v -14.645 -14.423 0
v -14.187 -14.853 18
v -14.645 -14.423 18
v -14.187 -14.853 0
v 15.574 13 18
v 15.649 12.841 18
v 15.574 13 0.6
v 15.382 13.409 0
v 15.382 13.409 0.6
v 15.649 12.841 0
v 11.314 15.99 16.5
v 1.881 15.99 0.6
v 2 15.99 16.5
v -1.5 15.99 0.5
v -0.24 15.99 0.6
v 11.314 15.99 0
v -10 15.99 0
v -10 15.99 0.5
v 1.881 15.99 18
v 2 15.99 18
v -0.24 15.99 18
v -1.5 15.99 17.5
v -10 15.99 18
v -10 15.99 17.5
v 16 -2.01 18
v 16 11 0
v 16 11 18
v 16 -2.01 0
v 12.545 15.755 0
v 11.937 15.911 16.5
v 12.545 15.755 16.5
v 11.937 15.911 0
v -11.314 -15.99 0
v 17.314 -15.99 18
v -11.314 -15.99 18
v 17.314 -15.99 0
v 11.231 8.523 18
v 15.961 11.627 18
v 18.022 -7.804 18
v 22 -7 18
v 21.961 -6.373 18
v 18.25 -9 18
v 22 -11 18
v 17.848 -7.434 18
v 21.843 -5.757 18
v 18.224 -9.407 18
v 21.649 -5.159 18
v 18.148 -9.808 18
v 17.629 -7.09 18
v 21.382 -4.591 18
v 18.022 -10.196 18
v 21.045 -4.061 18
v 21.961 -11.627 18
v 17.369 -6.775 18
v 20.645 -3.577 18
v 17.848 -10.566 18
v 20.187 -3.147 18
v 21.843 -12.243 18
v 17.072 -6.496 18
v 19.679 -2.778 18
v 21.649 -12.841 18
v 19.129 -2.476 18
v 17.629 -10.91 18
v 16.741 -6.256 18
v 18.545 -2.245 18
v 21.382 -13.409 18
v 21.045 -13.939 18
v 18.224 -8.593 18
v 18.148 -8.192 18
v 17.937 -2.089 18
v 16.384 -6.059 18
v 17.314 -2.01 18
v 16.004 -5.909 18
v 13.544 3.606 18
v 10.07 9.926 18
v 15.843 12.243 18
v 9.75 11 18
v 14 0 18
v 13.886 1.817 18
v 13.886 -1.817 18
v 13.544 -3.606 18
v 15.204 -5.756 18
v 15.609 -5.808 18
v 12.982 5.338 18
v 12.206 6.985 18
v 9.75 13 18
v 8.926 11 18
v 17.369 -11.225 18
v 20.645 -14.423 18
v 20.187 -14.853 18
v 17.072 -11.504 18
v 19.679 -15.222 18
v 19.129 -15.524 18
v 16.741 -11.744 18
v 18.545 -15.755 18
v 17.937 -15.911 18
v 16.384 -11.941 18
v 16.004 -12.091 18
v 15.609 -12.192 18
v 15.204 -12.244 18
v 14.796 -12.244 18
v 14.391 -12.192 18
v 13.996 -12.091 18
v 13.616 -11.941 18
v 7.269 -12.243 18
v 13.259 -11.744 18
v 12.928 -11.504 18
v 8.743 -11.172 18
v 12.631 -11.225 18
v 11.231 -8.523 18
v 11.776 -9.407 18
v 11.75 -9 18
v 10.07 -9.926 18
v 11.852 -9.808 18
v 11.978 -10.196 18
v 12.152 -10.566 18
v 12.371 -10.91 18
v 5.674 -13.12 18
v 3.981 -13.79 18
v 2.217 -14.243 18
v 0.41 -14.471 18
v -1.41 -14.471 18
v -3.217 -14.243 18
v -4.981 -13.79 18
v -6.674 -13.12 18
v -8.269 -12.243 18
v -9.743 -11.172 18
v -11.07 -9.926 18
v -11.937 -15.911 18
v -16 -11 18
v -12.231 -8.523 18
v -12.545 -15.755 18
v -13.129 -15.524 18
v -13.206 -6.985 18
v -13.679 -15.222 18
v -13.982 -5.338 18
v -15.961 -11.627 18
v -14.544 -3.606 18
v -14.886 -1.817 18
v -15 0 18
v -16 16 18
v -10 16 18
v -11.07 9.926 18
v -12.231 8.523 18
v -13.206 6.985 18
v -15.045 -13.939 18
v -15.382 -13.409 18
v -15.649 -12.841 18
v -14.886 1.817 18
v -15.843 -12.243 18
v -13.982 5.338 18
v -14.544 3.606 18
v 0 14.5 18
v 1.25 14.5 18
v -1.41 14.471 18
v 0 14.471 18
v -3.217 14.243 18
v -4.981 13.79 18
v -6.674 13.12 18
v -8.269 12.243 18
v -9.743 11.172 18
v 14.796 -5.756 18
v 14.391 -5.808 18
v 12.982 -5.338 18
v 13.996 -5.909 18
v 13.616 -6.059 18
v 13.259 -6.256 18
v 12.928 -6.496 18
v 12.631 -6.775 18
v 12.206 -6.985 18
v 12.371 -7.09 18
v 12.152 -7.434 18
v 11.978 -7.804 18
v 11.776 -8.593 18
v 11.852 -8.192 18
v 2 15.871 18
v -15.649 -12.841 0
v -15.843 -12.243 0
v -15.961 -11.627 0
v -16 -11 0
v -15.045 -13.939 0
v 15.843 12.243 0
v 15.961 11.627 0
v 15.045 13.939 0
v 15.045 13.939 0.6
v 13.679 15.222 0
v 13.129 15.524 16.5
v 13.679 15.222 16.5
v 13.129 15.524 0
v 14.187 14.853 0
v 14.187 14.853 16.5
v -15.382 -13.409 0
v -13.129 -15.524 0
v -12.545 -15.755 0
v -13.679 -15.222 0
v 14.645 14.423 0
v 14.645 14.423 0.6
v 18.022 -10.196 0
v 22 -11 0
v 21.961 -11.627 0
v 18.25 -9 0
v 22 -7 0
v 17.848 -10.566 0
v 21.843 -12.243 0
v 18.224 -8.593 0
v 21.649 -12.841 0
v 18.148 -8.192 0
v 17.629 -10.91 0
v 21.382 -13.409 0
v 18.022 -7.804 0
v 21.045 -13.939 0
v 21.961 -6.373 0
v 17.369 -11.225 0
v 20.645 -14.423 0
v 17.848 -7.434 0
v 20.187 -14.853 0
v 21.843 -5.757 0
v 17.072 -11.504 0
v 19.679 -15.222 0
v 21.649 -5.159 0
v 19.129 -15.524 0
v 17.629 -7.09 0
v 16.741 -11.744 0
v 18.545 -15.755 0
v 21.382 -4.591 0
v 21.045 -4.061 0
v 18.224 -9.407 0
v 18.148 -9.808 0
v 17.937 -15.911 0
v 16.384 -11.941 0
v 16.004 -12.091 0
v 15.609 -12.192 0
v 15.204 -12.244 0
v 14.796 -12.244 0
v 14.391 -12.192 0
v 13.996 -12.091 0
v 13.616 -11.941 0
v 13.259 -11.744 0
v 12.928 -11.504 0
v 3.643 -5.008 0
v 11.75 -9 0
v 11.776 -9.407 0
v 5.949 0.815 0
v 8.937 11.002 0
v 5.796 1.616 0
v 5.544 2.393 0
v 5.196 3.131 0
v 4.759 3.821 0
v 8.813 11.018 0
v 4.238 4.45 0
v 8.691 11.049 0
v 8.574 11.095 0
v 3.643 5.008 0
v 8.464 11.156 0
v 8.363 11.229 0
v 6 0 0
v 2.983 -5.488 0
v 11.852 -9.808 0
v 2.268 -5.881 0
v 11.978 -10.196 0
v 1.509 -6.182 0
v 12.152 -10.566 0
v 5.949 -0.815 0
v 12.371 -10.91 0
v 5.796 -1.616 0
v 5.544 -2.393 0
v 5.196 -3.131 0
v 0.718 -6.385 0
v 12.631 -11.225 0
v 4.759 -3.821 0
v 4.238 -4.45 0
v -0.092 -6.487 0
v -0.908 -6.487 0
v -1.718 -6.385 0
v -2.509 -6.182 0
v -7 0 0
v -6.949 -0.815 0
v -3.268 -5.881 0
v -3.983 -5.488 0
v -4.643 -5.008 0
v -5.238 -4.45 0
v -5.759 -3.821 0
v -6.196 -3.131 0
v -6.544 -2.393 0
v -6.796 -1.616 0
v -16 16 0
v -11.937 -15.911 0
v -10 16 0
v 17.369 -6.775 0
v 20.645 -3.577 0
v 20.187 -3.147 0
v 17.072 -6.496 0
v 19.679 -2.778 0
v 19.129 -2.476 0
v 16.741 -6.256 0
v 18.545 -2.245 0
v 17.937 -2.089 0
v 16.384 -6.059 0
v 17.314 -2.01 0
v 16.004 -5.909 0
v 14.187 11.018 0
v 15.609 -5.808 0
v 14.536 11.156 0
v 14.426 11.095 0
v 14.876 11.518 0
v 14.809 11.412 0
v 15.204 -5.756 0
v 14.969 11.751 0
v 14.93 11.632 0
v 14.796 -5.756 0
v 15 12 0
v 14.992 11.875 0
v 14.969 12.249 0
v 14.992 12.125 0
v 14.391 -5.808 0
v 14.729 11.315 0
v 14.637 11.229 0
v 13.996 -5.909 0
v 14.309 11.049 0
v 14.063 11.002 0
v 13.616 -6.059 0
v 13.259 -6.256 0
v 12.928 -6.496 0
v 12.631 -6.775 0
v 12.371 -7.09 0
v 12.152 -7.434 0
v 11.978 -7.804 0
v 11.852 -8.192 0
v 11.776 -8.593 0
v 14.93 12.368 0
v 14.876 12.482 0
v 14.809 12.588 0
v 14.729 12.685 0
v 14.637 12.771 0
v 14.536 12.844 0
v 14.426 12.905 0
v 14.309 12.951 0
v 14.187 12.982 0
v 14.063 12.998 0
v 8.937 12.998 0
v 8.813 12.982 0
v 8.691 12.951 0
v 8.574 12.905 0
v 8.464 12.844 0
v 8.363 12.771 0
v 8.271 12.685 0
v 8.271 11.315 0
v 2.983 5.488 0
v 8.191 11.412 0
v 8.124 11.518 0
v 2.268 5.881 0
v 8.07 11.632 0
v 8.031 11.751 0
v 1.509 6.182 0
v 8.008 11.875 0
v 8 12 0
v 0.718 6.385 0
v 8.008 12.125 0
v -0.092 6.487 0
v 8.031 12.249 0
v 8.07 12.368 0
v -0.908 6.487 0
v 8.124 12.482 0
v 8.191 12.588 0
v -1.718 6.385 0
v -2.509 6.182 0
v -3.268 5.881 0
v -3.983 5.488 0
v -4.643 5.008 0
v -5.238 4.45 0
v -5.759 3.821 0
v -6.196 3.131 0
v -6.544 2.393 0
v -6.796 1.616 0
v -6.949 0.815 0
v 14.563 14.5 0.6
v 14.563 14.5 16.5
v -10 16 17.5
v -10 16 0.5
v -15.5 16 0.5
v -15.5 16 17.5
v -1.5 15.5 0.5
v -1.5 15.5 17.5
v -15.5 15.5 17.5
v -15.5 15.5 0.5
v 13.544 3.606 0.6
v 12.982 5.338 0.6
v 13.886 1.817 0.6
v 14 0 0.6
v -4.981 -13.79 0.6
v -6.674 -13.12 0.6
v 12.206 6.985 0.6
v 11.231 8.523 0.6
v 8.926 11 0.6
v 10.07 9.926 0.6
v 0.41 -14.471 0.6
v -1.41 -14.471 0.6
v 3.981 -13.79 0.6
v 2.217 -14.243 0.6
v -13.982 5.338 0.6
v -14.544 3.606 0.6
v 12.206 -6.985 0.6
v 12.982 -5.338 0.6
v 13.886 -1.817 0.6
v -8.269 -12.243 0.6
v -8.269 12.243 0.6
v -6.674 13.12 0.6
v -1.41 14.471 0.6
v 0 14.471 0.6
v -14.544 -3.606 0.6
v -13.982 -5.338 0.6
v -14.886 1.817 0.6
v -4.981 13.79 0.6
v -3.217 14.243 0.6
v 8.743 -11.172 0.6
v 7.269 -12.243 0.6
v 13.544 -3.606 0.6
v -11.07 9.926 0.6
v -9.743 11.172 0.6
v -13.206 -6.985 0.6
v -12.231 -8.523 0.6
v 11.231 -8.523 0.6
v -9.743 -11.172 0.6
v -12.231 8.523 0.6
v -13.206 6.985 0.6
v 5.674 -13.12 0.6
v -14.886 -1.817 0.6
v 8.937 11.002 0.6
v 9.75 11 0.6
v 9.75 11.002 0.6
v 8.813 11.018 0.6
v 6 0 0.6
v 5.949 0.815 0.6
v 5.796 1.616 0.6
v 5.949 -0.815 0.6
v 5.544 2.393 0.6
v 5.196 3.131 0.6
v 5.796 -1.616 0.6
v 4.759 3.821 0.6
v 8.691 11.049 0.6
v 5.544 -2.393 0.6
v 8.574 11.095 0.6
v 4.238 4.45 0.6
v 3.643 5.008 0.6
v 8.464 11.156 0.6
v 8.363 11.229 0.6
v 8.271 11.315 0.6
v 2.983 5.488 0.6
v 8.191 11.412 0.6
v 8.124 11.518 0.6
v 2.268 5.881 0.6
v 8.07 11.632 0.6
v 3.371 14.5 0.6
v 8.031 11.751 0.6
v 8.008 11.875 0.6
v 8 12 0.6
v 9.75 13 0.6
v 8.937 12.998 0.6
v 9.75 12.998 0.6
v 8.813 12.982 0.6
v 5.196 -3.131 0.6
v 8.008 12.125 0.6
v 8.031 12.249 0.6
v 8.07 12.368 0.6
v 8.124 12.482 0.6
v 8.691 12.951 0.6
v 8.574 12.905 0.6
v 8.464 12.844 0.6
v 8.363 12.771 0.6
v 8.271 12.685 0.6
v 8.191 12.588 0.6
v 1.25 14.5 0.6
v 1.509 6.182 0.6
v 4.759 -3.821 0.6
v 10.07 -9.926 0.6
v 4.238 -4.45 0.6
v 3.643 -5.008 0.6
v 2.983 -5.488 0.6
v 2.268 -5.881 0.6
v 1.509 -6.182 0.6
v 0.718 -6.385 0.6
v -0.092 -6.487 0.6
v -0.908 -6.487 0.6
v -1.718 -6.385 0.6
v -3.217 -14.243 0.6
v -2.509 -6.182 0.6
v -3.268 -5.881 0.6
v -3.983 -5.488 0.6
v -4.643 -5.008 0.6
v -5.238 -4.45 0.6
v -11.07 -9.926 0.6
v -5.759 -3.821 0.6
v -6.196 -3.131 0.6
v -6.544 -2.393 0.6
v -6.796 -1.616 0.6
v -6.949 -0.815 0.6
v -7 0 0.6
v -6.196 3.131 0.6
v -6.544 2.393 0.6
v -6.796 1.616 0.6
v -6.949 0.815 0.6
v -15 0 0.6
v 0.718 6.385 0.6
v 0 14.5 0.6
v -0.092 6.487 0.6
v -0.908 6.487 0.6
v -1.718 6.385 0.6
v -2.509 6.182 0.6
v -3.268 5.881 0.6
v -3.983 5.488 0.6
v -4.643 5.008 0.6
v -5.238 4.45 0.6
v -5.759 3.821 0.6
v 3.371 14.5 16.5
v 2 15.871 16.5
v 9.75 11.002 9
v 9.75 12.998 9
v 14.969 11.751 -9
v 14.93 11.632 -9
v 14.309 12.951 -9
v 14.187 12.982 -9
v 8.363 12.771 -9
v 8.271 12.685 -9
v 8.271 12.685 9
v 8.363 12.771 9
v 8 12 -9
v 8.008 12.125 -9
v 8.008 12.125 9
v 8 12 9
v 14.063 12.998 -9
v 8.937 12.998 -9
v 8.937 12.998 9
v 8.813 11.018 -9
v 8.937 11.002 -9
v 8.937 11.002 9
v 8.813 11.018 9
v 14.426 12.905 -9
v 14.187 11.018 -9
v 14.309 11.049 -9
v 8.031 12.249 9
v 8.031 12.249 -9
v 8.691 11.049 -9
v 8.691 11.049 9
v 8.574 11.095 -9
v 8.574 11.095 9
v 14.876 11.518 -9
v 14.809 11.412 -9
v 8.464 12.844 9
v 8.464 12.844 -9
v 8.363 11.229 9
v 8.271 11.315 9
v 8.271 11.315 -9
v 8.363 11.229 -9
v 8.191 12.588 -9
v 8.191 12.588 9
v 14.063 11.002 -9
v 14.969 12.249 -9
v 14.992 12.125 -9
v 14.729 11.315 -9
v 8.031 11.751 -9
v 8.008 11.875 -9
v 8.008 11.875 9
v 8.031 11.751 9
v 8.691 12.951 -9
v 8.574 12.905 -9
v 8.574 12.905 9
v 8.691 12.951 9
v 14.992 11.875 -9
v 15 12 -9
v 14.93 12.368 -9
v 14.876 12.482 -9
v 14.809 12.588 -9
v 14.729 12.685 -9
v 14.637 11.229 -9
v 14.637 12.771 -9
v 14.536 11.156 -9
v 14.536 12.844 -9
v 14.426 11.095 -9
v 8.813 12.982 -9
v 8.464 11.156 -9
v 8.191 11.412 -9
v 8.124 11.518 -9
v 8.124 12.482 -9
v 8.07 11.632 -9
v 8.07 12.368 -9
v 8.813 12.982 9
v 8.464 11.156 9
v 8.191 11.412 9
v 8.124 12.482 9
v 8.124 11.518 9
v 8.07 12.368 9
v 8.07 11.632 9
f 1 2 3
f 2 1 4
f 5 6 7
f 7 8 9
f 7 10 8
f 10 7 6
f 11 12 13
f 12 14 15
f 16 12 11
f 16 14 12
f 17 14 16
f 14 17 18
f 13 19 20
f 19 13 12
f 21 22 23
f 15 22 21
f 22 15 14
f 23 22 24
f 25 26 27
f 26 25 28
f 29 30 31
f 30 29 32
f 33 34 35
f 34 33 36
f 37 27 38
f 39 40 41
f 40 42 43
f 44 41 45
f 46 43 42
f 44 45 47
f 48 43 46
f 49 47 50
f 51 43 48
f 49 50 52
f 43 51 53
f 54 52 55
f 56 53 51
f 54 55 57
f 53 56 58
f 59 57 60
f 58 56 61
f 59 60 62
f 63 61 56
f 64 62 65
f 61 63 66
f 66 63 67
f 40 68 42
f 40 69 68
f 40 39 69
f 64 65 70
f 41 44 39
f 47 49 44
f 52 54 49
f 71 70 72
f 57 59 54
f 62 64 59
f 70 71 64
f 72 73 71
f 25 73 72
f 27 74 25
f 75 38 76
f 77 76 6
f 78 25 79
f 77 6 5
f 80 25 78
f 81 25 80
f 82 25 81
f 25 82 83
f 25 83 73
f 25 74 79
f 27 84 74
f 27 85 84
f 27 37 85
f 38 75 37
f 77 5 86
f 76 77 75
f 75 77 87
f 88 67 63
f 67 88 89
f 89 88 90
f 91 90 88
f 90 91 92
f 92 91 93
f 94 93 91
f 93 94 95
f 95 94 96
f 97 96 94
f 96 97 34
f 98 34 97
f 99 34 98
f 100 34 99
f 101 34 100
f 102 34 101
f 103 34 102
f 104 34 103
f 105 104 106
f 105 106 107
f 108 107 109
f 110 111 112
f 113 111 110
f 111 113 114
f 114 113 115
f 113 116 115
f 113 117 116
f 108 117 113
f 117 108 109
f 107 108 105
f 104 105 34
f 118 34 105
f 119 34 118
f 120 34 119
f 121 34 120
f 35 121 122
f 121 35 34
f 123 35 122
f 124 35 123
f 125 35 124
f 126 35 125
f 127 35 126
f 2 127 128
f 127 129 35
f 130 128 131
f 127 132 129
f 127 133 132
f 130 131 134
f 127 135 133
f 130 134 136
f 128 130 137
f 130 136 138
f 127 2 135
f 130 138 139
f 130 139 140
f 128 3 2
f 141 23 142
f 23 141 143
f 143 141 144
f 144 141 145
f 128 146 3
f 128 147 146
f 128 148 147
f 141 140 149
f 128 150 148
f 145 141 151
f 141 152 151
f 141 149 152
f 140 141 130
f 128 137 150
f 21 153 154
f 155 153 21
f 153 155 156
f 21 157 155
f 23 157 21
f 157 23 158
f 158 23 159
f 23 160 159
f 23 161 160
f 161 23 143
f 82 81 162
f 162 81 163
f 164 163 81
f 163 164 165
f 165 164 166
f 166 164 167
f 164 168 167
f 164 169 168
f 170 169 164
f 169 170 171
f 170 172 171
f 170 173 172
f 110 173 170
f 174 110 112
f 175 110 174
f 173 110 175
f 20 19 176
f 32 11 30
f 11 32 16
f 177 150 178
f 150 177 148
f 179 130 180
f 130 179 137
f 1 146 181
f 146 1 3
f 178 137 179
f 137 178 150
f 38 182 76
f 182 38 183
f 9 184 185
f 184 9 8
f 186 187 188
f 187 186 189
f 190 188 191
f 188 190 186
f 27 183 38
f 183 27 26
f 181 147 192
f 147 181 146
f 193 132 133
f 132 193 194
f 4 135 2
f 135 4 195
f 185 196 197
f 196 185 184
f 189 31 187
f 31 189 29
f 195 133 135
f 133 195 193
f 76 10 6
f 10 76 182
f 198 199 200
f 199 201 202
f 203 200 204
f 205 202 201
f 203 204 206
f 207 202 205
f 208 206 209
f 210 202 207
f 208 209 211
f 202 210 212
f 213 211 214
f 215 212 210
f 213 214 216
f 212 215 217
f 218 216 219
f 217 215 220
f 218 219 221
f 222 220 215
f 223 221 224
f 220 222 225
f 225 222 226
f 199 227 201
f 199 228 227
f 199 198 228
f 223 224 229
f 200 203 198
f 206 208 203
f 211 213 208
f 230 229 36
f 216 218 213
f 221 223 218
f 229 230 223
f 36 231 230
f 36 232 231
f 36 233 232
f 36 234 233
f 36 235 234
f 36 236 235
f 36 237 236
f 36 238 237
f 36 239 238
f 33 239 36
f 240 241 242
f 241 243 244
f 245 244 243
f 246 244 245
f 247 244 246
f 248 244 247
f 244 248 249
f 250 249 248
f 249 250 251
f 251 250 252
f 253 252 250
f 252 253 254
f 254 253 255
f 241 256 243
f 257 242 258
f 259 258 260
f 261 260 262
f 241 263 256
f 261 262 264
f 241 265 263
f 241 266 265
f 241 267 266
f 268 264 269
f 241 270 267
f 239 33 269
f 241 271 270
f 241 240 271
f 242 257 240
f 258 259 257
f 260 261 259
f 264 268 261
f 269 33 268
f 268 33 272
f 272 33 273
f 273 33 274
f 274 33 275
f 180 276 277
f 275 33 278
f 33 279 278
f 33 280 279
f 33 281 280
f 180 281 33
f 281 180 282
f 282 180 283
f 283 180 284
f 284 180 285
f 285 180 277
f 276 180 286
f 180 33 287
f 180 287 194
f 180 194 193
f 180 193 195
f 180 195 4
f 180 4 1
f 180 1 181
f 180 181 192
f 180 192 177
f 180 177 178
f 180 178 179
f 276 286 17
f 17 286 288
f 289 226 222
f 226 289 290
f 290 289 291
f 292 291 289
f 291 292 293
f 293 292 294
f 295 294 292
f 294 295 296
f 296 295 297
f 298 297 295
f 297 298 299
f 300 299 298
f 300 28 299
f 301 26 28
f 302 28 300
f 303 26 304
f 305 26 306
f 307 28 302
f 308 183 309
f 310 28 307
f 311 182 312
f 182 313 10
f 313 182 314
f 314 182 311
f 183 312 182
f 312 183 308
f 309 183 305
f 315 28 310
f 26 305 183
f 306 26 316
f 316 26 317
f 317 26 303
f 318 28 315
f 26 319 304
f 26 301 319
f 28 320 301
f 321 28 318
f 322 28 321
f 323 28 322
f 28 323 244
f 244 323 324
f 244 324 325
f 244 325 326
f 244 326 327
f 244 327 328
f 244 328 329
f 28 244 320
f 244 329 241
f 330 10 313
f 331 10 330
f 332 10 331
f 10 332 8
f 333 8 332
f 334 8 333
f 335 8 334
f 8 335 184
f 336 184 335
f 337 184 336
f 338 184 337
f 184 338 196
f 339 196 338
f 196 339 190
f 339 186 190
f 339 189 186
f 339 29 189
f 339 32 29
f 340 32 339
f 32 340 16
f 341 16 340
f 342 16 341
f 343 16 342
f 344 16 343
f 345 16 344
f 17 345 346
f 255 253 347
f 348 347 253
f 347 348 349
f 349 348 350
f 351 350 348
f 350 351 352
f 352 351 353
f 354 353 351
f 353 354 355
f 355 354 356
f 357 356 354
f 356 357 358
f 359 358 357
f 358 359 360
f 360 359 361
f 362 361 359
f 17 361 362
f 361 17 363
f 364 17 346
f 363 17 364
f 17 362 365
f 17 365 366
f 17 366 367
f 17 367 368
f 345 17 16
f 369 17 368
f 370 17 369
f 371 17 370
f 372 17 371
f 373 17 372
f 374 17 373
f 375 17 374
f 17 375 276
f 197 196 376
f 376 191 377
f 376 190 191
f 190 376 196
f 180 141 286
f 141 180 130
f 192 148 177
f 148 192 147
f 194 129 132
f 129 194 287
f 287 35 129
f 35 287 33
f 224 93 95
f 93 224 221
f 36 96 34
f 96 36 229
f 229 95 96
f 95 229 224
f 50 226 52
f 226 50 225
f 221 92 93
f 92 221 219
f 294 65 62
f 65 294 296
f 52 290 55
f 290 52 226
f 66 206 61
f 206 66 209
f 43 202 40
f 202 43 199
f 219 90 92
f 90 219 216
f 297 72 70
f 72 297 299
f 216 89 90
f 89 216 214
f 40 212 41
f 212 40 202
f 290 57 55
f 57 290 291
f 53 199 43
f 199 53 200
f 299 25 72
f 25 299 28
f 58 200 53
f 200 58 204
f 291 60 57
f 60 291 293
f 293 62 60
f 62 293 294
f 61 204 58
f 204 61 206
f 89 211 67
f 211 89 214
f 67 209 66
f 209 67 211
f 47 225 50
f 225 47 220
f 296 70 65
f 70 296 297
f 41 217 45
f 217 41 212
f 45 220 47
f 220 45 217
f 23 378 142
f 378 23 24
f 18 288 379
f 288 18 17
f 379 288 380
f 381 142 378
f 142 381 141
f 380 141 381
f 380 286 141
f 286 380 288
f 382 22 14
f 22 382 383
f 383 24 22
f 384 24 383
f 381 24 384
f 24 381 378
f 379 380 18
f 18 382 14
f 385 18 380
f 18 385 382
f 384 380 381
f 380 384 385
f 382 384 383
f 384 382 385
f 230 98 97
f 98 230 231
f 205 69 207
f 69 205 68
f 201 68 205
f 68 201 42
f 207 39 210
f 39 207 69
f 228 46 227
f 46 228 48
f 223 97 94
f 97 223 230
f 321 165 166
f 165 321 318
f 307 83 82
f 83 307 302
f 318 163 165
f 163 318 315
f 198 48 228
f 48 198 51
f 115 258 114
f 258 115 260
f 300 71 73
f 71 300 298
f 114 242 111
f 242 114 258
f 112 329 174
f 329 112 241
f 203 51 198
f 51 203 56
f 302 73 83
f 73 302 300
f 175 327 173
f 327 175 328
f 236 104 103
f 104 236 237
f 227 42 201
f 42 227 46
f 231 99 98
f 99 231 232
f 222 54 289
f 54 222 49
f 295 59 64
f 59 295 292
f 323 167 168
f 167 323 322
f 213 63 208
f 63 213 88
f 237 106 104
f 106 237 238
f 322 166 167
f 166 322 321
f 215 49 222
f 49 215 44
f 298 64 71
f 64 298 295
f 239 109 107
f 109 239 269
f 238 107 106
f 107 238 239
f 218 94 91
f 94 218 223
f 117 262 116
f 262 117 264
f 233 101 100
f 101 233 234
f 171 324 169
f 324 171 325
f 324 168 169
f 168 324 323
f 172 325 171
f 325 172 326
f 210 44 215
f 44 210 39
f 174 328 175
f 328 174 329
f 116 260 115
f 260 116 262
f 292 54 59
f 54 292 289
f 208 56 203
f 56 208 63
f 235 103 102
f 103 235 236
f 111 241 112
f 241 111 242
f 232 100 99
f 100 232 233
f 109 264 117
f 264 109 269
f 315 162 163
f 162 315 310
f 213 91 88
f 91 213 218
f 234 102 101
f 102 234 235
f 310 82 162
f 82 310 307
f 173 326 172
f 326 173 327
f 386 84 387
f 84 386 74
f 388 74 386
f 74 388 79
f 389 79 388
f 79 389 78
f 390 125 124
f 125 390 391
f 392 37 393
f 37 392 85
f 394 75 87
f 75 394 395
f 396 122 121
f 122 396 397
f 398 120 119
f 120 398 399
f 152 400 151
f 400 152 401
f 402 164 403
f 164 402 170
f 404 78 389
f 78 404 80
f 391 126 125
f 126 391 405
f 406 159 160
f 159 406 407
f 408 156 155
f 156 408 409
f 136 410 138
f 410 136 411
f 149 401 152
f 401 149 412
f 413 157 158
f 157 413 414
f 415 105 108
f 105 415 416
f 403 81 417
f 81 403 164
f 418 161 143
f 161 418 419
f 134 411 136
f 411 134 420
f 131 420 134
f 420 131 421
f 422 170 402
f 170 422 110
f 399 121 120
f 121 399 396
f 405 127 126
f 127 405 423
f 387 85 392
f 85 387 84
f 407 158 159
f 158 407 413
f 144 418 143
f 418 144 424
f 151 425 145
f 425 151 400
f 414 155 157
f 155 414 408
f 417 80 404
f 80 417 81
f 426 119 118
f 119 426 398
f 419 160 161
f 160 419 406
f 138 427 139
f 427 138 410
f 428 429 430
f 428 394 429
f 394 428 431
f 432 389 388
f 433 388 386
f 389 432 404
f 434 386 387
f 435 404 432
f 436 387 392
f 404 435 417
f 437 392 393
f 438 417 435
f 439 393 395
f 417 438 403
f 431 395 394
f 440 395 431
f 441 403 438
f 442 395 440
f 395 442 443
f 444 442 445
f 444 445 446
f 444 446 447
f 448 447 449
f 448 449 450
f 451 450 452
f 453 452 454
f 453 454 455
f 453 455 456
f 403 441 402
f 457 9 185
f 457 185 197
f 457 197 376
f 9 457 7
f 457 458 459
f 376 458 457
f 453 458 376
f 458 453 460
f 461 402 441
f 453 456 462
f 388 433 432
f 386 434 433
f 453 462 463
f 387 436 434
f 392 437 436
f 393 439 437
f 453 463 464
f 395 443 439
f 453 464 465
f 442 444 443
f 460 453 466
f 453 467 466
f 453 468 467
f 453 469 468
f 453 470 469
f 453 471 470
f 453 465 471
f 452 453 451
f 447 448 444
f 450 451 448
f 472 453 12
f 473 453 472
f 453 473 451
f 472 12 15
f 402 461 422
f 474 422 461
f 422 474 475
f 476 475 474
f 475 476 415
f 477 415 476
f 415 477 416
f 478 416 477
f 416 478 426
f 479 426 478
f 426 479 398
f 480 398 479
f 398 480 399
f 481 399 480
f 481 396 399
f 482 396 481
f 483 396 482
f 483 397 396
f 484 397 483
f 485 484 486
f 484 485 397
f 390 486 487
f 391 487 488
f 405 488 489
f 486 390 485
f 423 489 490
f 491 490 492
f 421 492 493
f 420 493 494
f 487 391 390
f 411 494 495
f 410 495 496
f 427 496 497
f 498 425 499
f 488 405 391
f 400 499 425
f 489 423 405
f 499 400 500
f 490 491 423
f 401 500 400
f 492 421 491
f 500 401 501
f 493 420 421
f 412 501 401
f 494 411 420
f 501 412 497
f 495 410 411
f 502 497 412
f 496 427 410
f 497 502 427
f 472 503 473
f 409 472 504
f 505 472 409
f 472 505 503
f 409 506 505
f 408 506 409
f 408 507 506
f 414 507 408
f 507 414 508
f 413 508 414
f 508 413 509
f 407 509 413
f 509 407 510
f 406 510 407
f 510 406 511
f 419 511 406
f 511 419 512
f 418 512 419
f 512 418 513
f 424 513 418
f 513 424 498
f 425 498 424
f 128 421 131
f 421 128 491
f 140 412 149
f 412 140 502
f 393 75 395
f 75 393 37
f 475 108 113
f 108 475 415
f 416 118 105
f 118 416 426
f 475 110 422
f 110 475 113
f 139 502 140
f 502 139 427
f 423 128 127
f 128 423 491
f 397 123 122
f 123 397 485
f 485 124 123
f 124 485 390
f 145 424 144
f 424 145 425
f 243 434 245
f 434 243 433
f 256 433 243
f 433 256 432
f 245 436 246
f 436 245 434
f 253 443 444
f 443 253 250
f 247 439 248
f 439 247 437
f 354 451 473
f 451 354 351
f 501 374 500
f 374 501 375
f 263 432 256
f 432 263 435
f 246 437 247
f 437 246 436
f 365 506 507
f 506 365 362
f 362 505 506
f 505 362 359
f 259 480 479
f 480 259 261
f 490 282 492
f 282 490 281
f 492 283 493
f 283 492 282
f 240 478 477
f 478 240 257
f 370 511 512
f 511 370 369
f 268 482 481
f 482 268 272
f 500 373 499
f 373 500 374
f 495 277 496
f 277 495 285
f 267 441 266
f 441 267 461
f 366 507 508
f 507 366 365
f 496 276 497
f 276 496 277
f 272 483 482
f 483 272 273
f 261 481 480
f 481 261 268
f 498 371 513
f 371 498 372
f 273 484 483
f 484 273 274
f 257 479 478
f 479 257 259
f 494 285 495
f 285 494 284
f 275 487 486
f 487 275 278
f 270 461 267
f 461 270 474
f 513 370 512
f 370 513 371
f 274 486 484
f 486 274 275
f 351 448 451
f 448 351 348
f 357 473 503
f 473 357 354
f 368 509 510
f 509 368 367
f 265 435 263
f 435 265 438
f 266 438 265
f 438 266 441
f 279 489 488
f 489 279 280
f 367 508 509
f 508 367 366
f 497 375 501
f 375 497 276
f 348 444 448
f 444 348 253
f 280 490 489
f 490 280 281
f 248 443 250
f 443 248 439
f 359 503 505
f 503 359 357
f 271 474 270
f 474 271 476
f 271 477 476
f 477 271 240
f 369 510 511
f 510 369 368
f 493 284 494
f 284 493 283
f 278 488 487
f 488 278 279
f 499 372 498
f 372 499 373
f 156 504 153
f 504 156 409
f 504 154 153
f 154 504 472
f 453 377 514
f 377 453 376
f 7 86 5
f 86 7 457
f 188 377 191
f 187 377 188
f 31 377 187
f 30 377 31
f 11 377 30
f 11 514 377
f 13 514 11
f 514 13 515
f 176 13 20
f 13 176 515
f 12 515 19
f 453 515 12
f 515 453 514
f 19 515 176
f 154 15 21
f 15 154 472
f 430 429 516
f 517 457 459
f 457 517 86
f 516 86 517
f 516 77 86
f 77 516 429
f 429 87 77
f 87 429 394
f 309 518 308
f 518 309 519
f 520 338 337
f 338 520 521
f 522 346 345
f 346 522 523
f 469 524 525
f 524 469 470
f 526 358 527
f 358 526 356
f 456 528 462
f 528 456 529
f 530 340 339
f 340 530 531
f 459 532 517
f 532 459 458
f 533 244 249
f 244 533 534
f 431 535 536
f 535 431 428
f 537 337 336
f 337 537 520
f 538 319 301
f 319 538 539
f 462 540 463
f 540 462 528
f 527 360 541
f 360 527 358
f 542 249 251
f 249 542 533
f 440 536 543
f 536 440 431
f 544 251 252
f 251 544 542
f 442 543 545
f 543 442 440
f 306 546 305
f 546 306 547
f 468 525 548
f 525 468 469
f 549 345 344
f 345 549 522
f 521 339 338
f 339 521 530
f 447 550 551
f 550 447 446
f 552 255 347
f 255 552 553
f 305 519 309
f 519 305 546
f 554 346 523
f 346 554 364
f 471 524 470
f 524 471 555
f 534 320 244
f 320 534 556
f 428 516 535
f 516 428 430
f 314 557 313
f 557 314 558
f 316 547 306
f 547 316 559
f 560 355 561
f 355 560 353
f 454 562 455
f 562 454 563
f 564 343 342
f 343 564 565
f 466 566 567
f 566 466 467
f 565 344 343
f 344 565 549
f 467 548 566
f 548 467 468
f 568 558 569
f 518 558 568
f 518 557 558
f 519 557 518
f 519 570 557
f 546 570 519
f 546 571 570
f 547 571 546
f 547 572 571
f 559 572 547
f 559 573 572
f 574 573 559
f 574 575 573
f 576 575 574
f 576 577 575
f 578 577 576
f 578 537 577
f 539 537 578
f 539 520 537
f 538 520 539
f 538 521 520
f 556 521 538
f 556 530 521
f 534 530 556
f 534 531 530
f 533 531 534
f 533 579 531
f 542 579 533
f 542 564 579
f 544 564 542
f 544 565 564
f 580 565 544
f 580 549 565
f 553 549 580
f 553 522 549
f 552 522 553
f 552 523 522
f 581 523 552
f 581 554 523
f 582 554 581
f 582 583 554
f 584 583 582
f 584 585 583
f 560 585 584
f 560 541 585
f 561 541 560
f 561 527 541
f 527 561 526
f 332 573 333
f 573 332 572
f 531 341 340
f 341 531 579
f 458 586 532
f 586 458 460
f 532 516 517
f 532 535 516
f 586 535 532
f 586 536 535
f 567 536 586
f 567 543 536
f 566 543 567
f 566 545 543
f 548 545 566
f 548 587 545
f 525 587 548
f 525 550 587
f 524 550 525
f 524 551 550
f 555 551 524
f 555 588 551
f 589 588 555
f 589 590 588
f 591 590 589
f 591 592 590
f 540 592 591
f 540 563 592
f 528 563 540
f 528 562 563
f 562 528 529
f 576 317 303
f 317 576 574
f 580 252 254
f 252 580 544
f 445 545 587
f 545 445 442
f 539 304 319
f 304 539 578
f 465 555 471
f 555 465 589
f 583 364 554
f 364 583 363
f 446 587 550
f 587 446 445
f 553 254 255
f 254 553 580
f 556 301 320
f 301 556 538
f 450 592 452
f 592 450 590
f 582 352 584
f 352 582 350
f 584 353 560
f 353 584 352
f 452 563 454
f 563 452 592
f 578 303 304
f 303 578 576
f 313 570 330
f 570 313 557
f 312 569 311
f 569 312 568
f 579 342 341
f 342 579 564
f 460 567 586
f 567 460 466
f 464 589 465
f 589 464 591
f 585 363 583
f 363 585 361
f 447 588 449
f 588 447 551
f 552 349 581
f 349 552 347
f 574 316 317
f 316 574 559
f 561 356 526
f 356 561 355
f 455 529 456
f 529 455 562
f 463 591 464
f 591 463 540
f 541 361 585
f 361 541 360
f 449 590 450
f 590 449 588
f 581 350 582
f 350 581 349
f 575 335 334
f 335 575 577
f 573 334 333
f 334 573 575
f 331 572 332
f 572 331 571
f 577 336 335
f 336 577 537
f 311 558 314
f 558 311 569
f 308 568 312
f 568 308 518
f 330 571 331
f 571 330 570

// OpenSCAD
$fn = 50;


union() {
	difference() {
		union() {
			hull() {
				translate(v = [-11.0000000000, 11.0000000000, 0]) {
					cylinder(h = 18, r = 5);
				}
				translate(v = [11.0000000000, 11.0000000000, 0]) {
					cylinder(h = 18, r = 5);
				}
				translate(v = [-11.0000000000, -11.0000000000, 0]) {
					cylinder(h = 18, r = 5);
				}
				translate(v = [11.0000000000, -11.0000000000, 0]) {
					cylinder(h = 18, r = 5);
				}
			}
			translate(v = [7.5000000000, -9.0000000000, 0]) {
				hull() {
					translate(v = [-9.5000000000, 2.0000000000, 0]) {
						cylinder(h = 18, r = 5);
					}
					translate(v = [9.5000000000, 2.0000000000, 0]) {
						cylinder(h = 18, r = 5);
					}
					translate(v = [-9.5000000000, -2.0000000000, 0]) {
						cylinder(h = 18, r = 5);
					}
					translate(v = [9.5000000000, -2.0000000000, 0]) {
						cylinder(h = 18, r = 5);
					}
				}
			}
			translate(v = [-16.0000000000, 10.0000000000, 0]) {
				cube(size = [6, 6, 18]);
			}
		}
		union() {
			translate(v = [-15.5000000000, 15.5000000000, 0.5000000000]) {
				cube(size = [14, 0.5000000000, 17.0000000000]);
			}
			translate(v = [15.0000000000, -9.0000000000, -100.0000000000]) {
				cylinder(h = 200, r = 3.2500000000);
			}
			translate(v = [-0.5000000000, 0.0000000000, 0.6000000000]) {
				cylinder(h = 20.4000000000, r = 14.5000000000);
			}
			translate(v = [-0.5000000000, 0.0000000000, -9.0000000000]) {
				cylinder(h = 18, r = 6.5000000000);
			}
			translate(v = [0.0000000000, 13.0000000000, 0.6000000000]) {
				cube(size = [16.0000000000, 1.5000000000, 20.4000000000]);
			}
			translate(v = [2.0000000000, 13.0000000000, 16.5000000000]) {
				cube(size = [14.0000000000, 4.5000000000, 1.5000000000]);
			}
			translate(v = [-3.0000000000, 18.7500000000, 0.6000000000]) {
				rotate(a = [0, 0, -45]) {
					cube(size = [10, 1.5000000000, 20.4000000000]);
				}
			}
			translate(v = [2.2500000000, 11.0000000000, 0.6000000000]) {
				cube(size = [7.5000000000, 2, 17.4000000000]);
			}
		}
	}
	union() {
		translate(v = [11.5000000000, 12, -9.0000000000]) {
			rotate(a = [0, 0, 0]) {
				difference() {
					union() {
						hull() {
							translate(v = [2.5000000000, 0, 0]) {
								cylinder(h = 18, r = 1.0000000000, r1 = 1.0000000000, r2 = 1.0000000000);
							}
							translate(v = [-2.5000000000, 0, 0]) {
								cylinder(h = 18, r = 1.0000000000, r1 = 1.0000000000, r2 = 1.0000000000);
							}
						}
					}
					union();
				}
			}
		}
	}
}
